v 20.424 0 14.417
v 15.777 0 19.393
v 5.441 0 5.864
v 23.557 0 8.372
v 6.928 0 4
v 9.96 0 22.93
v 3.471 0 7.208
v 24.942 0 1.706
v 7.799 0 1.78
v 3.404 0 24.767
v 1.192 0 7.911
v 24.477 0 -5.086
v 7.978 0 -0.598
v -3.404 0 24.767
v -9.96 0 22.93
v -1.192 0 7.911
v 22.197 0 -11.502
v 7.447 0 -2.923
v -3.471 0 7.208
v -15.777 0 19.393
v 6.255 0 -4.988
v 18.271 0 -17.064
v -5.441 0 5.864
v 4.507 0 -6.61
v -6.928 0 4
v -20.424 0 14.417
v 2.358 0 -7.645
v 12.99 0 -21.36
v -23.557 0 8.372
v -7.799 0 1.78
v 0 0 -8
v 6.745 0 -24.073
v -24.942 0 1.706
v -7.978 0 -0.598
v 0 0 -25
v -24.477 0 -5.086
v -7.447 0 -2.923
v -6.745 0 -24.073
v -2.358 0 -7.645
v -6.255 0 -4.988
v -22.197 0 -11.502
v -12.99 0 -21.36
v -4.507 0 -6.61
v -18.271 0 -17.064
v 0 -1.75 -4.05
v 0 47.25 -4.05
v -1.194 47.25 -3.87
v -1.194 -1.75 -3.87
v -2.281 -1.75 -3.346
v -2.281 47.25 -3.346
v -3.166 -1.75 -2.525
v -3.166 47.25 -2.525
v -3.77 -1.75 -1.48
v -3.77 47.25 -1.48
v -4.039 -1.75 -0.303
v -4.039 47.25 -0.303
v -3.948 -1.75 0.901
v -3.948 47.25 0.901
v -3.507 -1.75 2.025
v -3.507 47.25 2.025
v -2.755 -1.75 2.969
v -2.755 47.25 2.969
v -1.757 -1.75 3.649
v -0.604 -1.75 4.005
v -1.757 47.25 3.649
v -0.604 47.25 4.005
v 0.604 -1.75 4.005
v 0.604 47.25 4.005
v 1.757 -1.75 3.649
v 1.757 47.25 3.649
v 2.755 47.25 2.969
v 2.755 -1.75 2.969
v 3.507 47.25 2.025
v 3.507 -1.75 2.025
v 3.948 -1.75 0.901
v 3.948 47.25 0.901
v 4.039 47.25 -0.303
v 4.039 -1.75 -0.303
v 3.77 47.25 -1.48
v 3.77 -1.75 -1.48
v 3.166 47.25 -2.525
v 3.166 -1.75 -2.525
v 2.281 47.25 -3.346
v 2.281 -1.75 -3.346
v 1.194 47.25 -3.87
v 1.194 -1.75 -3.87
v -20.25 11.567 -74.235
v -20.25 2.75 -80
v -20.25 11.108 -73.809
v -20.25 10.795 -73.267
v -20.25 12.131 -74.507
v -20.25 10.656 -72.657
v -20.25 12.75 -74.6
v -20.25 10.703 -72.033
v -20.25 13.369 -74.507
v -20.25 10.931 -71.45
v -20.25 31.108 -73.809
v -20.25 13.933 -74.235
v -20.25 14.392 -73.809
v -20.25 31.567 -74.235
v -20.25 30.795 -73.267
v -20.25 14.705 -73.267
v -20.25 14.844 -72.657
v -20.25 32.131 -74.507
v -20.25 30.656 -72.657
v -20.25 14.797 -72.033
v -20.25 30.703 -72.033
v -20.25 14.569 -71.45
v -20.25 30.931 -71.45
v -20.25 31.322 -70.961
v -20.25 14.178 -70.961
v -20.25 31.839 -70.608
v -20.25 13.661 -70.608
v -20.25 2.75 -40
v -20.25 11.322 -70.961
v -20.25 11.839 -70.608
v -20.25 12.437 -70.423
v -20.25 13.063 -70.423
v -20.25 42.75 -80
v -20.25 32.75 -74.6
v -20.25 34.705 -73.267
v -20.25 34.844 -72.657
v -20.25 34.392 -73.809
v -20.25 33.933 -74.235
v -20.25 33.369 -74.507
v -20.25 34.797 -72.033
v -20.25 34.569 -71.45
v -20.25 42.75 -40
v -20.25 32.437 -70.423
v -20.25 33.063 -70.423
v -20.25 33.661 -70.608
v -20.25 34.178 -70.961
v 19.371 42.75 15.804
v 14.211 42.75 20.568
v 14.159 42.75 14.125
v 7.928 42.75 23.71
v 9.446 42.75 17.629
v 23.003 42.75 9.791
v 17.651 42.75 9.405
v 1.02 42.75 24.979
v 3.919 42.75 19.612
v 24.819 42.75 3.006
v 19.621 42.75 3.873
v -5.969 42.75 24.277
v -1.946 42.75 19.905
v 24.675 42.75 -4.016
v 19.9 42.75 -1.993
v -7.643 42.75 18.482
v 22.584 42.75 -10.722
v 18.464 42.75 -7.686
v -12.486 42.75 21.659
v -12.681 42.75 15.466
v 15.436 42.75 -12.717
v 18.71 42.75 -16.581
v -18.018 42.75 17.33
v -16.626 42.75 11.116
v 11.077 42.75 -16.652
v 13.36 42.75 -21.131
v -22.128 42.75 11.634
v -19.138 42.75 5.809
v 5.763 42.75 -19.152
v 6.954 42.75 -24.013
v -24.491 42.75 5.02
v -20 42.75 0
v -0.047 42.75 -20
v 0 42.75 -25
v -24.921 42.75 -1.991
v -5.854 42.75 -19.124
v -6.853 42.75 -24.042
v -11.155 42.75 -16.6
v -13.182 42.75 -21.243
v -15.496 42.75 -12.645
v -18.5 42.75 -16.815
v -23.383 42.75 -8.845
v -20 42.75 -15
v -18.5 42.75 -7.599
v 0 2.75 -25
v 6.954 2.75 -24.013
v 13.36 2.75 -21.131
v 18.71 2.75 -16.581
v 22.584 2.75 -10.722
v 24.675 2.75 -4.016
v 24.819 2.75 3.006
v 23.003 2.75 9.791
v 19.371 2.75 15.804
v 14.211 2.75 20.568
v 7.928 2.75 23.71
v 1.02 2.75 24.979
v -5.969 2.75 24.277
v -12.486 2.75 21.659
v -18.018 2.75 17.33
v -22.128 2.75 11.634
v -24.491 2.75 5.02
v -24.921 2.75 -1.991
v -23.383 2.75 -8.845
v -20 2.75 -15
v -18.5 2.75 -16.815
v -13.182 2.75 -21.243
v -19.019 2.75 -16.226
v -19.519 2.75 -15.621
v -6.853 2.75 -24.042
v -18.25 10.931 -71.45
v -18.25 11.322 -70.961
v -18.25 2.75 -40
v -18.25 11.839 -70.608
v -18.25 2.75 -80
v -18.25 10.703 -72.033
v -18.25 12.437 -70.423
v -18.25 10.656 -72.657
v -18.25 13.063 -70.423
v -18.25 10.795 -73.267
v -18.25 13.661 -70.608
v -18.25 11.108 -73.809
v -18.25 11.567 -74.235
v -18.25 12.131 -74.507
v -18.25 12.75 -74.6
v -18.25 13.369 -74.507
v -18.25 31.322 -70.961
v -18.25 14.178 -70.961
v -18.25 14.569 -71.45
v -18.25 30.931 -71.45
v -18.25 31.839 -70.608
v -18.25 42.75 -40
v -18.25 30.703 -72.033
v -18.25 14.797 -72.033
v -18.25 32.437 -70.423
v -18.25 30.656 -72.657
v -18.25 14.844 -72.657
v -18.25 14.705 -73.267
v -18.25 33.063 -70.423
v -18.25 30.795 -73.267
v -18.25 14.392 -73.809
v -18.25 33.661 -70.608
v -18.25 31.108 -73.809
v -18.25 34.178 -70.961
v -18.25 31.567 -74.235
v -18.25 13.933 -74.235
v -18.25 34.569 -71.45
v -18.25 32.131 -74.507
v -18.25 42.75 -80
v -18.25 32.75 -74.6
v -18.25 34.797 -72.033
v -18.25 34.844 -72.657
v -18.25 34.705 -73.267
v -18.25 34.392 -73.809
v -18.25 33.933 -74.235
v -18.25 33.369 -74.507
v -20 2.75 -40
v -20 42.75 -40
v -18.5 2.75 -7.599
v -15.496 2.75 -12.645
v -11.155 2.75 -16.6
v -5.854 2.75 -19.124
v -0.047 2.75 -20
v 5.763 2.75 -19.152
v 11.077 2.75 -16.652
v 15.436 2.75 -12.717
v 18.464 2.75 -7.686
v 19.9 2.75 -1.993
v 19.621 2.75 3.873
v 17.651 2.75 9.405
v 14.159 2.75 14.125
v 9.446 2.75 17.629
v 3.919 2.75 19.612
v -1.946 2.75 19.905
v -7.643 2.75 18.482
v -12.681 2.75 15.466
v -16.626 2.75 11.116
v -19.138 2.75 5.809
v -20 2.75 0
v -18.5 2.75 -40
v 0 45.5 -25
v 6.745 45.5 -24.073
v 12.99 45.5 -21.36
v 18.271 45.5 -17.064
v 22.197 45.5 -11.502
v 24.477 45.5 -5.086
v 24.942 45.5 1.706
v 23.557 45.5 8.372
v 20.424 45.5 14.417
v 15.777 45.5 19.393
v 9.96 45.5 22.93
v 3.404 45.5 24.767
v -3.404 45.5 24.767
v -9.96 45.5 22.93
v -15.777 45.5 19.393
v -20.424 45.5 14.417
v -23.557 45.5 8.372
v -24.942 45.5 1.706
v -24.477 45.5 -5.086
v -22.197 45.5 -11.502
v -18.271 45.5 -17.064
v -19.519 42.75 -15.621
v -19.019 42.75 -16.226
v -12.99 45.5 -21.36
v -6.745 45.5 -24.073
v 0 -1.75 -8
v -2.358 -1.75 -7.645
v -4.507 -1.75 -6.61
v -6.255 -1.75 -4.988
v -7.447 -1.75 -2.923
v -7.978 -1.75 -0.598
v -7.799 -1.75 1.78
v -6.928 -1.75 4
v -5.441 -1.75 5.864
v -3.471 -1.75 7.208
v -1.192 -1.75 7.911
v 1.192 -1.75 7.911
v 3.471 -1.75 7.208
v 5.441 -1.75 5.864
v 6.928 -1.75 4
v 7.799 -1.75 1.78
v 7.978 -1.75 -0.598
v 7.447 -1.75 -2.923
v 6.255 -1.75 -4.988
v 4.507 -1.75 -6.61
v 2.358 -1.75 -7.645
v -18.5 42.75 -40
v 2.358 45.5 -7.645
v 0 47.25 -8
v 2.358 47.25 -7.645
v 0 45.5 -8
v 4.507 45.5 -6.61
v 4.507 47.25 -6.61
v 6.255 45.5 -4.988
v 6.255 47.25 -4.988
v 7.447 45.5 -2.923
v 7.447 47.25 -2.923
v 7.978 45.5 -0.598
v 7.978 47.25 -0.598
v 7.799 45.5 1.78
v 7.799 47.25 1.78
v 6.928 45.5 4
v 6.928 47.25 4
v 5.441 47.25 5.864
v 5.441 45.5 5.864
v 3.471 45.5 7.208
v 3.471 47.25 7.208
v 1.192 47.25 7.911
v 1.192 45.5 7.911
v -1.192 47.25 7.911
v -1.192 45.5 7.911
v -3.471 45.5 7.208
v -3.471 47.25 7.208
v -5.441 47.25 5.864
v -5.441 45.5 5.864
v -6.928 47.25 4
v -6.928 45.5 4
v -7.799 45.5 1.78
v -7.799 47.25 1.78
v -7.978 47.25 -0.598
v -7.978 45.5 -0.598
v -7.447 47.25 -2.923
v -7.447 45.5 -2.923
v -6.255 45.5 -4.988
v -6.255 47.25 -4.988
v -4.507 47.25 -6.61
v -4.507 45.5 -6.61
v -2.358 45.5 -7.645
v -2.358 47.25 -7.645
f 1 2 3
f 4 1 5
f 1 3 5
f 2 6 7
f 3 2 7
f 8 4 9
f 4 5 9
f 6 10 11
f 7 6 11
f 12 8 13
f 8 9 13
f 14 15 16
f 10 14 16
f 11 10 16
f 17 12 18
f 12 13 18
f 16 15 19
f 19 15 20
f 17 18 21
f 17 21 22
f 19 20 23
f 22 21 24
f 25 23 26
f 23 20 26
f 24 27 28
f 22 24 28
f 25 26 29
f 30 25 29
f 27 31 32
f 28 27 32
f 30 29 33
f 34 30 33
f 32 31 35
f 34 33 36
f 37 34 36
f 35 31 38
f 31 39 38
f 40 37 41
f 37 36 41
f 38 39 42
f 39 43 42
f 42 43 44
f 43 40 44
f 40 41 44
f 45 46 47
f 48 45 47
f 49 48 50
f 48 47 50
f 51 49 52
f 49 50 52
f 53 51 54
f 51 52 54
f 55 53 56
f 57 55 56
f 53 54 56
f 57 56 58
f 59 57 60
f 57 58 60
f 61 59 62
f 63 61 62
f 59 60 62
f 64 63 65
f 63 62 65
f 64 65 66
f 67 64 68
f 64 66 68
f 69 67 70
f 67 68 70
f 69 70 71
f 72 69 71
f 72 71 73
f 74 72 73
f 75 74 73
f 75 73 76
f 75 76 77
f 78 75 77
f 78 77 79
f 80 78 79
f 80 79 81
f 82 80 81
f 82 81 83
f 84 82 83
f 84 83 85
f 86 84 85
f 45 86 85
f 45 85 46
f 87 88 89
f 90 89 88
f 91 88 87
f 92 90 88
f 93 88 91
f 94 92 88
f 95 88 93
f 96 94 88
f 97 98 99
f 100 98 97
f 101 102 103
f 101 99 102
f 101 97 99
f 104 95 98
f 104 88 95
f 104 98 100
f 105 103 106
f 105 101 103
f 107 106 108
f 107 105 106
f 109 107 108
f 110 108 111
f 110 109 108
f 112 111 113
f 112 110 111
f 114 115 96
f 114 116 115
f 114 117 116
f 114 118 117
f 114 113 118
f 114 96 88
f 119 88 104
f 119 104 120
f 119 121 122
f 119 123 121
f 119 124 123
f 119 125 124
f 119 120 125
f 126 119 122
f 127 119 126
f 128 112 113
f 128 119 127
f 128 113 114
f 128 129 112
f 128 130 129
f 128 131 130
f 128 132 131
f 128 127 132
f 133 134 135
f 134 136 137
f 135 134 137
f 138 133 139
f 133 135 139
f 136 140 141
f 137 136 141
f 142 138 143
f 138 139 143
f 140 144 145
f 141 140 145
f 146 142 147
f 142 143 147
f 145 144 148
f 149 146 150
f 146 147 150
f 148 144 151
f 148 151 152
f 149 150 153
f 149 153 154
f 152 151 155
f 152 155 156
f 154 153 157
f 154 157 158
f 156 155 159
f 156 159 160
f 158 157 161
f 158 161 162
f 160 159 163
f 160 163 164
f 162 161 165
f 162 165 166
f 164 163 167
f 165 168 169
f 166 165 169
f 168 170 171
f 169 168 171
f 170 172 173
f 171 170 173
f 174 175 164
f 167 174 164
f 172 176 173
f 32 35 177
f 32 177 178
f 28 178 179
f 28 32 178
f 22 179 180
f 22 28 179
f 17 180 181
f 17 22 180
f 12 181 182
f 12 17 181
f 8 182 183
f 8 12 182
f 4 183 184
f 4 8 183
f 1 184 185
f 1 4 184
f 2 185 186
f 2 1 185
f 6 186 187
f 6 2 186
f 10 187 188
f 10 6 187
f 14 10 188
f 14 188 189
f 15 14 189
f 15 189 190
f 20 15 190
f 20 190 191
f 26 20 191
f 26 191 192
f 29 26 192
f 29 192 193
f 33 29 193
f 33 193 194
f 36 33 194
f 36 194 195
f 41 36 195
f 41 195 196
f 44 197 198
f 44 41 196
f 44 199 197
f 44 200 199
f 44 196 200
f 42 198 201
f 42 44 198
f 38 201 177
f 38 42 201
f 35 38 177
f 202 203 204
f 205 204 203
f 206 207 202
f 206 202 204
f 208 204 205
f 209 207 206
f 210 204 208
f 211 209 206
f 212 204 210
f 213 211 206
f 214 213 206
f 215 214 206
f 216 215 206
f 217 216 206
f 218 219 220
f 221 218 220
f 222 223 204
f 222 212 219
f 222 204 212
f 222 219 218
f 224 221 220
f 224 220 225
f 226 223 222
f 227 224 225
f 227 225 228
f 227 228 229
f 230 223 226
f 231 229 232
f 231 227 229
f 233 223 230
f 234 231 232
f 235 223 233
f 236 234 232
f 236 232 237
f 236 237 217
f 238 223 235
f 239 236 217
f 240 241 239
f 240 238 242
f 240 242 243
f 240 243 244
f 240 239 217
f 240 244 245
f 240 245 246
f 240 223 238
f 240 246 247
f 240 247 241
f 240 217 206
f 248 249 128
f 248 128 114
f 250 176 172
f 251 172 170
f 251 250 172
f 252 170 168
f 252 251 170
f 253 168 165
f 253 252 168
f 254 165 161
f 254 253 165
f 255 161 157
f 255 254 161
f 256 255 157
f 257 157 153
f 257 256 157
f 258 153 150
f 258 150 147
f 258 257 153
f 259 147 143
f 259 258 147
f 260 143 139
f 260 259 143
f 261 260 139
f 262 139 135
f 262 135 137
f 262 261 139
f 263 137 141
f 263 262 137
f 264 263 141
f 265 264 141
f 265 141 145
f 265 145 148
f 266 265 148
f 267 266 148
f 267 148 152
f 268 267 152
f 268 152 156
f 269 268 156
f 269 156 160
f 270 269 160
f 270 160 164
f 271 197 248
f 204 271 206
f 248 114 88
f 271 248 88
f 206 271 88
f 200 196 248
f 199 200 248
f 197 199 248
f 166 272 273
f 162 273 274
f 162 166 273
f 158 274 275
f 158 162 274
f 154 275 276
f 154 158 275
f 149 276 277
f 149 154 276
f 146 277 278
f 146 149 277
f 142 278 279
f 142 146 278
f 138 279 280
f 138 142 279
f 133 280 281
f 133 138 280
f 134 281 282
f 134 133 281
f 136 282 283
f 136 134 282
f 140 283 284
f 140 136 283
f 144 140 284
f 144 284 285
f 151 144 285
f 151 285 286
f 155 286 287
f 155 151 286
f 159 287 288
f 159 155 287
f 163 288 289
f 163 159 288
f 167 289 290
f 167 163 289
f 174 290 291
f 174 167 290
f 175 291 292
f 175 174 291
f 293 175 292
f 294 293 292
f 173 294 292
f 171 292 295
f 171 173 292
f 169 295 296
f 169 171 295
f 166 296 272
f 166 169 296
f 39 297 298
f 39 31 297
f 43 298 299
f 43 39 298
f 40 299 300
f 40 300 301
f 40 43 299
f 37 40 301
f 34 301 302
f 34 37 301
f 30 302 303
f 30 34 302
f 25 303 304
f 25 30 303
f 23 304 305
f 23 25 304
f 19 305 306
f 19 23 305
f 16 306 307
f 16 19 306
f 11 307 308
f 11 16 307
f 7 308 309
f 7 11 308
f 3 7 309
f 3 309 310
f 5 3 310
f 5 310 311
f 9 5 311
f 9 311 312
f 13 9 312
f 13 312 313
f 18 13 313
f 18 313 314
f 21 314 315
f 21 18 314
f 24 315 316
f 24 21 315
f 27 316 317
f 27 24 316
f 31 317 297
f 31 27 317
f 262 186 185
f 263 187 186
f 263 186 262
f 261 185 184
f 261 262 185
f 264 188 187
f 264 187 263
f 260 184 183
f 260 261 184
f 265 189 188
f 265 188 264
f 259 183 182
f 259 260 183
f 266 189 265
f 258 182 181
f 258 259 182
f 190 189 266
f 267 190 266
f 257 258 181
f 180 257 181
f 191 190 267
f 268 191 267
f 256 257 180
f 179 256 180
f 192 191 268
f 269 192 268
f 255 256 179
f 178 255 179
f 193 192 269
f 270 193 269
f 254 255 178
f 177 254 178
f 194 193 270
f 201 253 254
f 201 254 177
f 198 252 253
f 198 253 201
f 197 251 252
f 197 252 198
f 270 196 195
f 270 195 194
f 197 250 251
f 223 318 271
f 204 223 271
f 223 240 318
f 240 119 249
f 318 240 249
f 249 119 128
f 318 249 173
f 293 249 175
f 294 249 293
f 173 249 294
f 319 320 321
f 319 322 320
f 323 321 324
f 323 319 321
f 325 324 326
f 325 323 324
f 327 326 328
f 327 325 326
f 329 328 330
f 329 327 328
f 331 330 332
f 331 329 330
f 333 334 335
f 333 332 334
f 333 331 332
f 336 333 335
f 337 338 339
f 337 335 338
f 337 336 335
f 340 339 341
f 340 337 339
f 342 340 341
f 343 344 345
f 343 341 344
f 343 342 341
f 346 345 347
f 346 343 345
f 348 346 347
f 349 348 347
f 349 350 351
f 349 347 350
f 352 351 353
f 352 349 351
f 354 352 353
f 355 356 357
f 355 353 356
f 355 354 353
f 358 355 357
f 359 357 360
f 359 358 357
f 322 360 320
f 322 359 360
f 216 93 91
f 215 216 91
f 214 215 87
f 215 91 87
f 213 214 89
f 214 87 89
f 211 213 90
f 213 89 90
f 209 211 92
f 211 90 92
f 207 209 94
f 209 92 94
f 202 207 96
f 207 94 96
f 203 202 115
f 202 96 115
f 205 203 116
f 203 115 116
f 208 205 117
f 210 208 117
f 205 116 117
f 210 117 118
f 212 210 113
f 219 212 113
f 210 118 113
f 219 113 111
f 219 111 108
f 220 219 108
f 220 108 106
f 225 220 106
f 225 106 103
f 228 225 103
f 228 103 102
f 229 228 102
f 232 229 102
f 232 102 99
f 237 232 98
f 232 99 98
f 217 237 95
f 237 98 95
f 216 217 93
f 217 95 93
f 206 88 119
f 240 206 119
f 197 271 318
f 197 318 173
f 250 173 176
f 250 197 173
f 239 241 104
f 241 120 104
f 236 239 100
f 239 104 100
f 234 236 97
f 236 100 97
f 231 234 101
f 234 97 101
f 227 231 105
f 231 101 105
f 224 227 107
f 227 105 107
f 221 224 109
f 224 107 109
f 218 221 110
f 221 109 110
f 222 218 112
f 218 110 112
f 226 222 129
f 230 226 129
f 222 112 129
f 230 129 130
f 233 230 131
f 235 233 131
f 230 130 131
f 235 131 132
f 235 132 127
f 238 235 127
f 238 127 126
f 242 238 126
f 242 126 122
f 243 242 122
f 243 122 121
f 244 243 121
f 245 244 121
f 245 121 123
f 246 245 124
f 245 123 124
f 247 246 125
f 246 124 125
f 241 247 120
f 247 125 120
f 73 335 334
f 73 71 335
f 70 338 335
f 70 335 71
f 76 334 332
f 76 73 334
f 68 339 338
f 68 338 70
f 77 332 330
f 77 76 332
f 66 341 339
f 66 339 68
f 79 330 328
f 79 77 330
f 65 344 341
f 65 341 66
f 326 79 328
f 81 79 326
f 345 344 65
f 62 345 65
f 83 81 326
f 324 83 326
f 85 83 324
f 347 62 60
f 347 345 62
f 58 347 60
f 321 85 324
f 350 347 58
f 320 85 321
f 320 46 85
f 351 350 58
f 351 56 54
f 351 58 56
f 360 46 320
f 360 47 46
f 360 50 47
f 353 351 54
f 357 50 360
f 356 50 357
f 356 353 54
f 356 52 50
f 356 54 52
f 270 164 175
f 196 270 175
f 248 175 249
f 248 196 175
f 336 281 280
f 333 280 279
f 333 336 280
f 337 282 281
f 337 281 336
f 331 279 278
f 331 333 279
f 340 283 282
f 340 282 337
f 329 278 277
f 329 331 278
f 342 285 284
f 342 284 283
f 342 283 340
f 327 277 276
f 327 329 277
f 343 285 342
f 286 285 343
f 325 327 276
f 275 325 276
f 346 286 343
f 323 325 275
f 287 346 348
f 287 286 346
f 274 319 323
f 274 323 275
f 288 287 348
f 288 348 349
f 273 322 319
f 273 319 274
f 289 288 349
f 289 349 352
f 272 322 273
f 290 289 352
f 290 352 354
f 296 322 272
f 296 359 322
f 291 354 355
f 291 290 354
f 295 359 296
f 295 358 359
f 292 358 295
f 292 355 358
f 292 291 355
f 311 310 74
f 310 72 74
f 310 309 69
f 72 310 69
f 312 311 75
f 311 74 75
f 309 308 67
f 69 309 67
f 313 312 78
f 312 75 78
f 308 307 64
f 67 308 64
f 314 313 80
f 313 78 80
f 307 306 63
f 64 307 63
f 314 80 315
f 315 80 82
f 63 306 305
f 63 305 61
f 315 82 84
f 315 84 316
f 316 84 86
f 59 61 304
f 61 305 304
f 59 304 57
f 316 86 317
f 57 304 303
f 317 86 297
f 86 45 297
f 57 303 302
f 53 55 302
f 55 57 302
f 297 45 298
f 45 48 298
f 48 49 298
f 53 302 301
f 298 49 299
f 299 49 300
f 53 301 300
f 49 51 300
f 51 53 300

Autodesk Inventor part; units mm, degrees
ref_plane "YZ Plane" through (0, 0, 0) normal (1, 0, 0) x (0, 1, 0)
ref_plane "XZ Plane" through (0, 0, 0) normal (0, 1, 0) x (-1, 0, 0)
ref_plane "XY Plane" through (0, 0, 0) normal (0, 0, 1) x (1, 0, 0)
sketch "スケッチ1" plane through (0, 0, 0) normal (1, 0, 0) x (0, 1, 0)
  line L0 (0, 0) -> (2.75, 0)
  line L1 (2.75, 0) -> (2.75, -25)
  line L2 (2.75, -25) -> (0, -25)
  line L3 (0, -25) -> (0, 0)
  line L4 (2.75, 0) -> (42.75, 0)
  line L5 (42.75, 0) -> (42.75, -20)
  line L6 (42.75, -20) -> (2.75, -20)
  line L7 (2.75, -20) -> (2.75, 0)
  line L8 (42.75, 0) -> (45.5, 0)
  line L9 (45.5, 0) -> (45.5, -25)
  line L10 (45.5, -25) -> (42.75, -25)
  line L11 (42.75, -25) -> (42.75, 0)
  line L12 (22.75, 0) -> (22.75, -20)
  line L13 (45.5, 0) -> (47.25, 0)
  line L14 (47.25, 0) -> (47.25, -8)
  line L15 (47.25, -8) -> (45.5, -8)
  line L16 (45.5, -8) -> (45.5, 0)
  line L17 (0, 0) -> (-1.75, 0)
  line L18 (-1.75, 0) -> (-1.75, -8)
  line L19 (-1.75, -8) -> (0, -8)
  line L20 (0, -8) -> (0, 0)
  line L21 (47.25, 0) -> (-1.75, 0)
  line L22 (-1.75, 0) -> (-1.75, -4.05)
  line L23 (-1.75, -4.05) -> (47.25, -4.05)
  line L24 (47.25, -4.05) -> (47.25, 0)
  point P0 (2.75, -20)
  point P1 (42.75, -20)
  dimension "d0" = 45.5
  dimension "d1" = 25
  dimension "d2" = 20
  dimension "d3" = 49
  dimension "d4" = 8
  dimension "d5" = 4.05
  dimension "d11" = 40
revolve "回転1" add sketch "スケッチ1" angle 360 about axis through (0, 2.75, 0) along (0, 1, 0) contours L23 L1 L2 L3 | L3 L19 L18 L23 | L23 L12 L6 L1 | L23 L5 L6 L12 | L23 L9 L10 L11 L5 | L23 L14 L15 L9
sketch "スケッチ2" plane through (0, 2.75, 0) normal (0, 1, 0) x (1, 0, 0)
  circle A0 centre (0, 0) radius 20 projected
  line L0 (-20, 0) -> (-20, 80)
  line L1 (-20, 80) -> (-18.5, 80)
  line L2 (-18.5, 80) -> (-18.5, 7.5993)
  circle A1 centre (0, 0) radius 20
  point P0 (0, 0)
  dimension "d7" = 80
  dimension "d8" = 1.5
extrude "押し出し1" add sketch "スケッチ2" along normal blind 40 contours A0 L0 L1 L2
sketch "スケッチ4" plane through (-20, 2.75, -80) normal (-1, 0, 0) x (0, 0, 1)
  line L0 (0, 40) -> (65, 40) projected
  line L1 (0, 40) -> (40, 40)
  line L2 (40, 40) -> (40, 0)
  line L3 (40, 0) -> (0, 0)
  line L4 (0, 0) -> (0, 40)
  point P0 (80, -2.75)
  dimension "d12" = 40
  dimension "d13" = 40
extrude "押し出し2" add sketch "スケッチ4" along normal blind 0.25
sketch "スケッチ5" plane through (-18.5, 2.75, -16.8152) normal (1, 0, 0) x (0, 0, -1)
  line L0 (63.1848, 0) -> (63.1848, 40) projected
  line L1 (0, 0) -> (63.1848, 0) projected
  line L2 (63.1848, 40) -> (23.1848, 40)
  line L3 (23.1848, 40) -> (23.1848, 0)
  line L4 (23.1848, 0) -> (63.1848, 0)
  line L5 (63.1848, 0) -> (63.1848, 40)
  point P0 (-16.8152, -2.75)
  dimension "d16" = 40
extrude "押し出し3" add sketch "スケッチ5" along normal blind 0.25
sketch "スケッチ6" plane through (-18.25, 2.75, -16.8152) normal (1, 0, 0) x (0, 0, -1)
  line L0 (63.1848, 40) -> (63.1848, 0) projected
  line L1 (63.1848, 20) -> (23.1848, 20)
  line L2 (23.1848, 0) -> (23.1848, 40) projected
  point P0 (-16.8152, -2.75)
  point P1 (55.6848, 30)
  point P2 (55.6848, 10)
  dimension "d19" = 20
  dimension "d20" = 7.5
hole "穴1" at (-18.25, 32.75, -72.5) at (-18.25, 12.75, -72.5) direction (-1, 0, 0) diameter 4.2 end through all
equation "\"d1\" = 0.5 * SpringD"
equation "\"d3\" = SpringWidth"
equation "\"SpringD\" = 50"
equation "\"SpringWidth\" = 49"
properties part number "定荷重バネ49N" material "アルミニウム 6061"
